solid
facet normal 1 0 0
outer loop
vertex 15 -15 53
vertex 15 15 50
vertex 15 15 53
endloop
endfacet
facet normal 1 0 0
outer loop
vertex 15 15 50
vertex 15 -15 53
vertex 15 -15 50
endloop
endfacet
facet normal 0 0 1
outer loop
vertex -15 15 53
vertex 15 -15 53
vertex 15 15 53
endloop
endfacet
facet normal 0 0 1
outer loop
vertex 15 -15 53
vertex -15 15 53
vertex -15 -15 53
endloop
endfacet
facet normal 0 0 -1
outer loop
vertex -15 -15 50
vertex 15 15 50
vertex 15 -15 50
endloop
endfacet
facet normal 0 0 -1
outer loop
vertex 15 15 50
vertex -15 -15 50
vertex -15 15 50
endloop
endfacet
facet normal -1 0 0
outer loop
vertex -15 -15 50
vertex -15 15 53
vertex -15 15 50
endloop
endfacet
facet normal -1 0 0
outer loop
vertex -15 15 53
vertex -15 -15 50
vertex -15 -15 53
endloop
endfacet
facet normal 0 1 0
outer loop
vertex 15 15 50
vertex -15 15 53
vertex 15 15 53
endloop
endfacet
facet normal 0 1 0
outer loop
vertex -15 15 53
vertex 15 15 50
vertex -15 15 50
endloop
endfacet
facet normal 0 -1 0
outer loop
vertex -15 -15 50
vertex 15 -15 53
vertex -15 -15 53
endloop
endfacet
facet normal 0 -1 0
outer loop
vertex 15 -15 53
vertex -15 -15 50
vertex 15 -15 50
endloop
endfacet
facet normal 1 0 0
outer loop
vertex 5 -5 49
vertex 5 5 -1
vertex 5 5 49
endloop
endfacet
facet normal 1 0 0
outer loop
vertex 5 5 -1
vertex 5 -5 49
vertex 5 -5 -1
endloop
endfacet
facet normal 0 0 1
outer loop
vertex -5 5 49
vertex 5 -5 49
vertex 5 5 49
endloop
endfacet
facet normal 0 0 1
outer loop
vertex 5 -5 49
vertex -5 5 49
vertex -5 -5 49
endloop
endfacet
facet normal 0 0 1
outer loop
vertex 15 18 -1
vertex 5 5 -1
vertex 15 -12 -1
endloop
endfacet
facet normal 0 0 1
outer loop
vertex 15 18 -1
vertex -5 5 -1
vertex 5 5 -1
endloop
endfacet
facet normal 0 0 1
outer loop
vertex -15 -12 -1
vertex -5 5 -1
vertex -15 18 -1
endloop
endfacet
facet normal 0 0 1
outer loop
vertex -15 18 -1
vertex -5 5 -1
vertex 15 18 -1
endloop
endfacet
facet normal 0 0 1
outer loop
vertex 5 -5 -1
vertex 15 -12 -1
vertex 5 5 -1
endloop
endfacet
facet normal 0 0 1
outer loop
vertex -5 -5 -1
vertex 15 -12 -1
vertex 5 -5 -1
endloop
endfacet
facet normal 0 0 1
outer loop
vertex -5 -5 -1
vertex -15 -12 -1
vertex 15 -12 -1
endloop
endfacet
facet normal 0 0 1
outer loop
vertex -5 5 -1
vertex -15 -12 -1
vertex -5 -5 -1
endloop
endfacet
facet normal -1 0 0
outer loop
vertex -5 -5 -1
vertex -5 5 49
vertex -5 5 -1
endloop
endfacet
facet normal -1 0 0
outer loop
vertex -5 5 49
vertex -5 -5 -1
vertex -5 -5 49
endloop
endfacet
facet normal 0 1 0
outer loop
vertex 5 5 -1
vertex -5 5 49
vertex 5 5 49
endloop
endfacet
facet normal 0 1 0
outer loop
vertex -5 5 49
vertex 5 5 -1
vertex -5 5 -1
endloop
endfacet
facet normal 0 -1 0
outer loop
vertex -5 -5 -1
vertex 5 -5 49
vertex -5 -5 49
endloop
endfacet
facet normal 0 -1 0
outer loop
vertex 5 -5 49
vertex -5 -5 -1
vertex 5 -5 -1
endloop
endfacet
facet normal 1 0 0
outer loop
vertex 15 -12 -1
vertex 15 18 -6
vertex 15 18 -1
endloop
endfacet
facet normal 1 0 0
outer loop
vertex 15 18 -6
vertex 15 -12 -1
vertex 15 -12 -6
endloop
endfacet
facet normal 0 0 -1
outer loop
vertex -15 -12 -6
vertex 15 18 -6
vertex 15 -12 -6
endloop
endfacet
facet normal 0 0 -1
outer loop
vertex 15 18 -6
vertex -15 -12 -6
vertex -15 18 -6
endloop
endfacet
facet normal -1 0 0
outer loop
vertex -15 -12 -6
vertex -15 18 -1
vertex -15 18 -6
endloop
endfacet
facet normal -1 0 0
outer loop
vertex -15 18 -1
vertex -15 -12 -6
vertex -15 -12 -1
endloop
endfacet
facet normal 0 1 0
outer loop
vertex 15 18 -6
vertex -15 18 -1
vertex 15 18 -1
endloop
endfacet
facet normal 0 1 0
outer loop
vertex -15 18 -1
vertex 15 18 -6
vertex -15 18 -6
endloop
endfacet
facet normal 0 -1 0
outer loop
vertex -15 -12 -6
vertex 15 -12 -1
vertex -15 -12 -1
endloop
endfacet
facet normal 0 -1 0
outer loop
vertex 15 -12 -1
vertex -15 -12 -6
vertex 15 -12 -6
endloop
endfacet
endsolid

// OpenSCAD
translate([-15,-15,50]) cube([30,30,3]);
translate([-5,-5,-1]) cube([10,10,50]);  
translate([-15,-12,-6]) cube([30,30,5]);
